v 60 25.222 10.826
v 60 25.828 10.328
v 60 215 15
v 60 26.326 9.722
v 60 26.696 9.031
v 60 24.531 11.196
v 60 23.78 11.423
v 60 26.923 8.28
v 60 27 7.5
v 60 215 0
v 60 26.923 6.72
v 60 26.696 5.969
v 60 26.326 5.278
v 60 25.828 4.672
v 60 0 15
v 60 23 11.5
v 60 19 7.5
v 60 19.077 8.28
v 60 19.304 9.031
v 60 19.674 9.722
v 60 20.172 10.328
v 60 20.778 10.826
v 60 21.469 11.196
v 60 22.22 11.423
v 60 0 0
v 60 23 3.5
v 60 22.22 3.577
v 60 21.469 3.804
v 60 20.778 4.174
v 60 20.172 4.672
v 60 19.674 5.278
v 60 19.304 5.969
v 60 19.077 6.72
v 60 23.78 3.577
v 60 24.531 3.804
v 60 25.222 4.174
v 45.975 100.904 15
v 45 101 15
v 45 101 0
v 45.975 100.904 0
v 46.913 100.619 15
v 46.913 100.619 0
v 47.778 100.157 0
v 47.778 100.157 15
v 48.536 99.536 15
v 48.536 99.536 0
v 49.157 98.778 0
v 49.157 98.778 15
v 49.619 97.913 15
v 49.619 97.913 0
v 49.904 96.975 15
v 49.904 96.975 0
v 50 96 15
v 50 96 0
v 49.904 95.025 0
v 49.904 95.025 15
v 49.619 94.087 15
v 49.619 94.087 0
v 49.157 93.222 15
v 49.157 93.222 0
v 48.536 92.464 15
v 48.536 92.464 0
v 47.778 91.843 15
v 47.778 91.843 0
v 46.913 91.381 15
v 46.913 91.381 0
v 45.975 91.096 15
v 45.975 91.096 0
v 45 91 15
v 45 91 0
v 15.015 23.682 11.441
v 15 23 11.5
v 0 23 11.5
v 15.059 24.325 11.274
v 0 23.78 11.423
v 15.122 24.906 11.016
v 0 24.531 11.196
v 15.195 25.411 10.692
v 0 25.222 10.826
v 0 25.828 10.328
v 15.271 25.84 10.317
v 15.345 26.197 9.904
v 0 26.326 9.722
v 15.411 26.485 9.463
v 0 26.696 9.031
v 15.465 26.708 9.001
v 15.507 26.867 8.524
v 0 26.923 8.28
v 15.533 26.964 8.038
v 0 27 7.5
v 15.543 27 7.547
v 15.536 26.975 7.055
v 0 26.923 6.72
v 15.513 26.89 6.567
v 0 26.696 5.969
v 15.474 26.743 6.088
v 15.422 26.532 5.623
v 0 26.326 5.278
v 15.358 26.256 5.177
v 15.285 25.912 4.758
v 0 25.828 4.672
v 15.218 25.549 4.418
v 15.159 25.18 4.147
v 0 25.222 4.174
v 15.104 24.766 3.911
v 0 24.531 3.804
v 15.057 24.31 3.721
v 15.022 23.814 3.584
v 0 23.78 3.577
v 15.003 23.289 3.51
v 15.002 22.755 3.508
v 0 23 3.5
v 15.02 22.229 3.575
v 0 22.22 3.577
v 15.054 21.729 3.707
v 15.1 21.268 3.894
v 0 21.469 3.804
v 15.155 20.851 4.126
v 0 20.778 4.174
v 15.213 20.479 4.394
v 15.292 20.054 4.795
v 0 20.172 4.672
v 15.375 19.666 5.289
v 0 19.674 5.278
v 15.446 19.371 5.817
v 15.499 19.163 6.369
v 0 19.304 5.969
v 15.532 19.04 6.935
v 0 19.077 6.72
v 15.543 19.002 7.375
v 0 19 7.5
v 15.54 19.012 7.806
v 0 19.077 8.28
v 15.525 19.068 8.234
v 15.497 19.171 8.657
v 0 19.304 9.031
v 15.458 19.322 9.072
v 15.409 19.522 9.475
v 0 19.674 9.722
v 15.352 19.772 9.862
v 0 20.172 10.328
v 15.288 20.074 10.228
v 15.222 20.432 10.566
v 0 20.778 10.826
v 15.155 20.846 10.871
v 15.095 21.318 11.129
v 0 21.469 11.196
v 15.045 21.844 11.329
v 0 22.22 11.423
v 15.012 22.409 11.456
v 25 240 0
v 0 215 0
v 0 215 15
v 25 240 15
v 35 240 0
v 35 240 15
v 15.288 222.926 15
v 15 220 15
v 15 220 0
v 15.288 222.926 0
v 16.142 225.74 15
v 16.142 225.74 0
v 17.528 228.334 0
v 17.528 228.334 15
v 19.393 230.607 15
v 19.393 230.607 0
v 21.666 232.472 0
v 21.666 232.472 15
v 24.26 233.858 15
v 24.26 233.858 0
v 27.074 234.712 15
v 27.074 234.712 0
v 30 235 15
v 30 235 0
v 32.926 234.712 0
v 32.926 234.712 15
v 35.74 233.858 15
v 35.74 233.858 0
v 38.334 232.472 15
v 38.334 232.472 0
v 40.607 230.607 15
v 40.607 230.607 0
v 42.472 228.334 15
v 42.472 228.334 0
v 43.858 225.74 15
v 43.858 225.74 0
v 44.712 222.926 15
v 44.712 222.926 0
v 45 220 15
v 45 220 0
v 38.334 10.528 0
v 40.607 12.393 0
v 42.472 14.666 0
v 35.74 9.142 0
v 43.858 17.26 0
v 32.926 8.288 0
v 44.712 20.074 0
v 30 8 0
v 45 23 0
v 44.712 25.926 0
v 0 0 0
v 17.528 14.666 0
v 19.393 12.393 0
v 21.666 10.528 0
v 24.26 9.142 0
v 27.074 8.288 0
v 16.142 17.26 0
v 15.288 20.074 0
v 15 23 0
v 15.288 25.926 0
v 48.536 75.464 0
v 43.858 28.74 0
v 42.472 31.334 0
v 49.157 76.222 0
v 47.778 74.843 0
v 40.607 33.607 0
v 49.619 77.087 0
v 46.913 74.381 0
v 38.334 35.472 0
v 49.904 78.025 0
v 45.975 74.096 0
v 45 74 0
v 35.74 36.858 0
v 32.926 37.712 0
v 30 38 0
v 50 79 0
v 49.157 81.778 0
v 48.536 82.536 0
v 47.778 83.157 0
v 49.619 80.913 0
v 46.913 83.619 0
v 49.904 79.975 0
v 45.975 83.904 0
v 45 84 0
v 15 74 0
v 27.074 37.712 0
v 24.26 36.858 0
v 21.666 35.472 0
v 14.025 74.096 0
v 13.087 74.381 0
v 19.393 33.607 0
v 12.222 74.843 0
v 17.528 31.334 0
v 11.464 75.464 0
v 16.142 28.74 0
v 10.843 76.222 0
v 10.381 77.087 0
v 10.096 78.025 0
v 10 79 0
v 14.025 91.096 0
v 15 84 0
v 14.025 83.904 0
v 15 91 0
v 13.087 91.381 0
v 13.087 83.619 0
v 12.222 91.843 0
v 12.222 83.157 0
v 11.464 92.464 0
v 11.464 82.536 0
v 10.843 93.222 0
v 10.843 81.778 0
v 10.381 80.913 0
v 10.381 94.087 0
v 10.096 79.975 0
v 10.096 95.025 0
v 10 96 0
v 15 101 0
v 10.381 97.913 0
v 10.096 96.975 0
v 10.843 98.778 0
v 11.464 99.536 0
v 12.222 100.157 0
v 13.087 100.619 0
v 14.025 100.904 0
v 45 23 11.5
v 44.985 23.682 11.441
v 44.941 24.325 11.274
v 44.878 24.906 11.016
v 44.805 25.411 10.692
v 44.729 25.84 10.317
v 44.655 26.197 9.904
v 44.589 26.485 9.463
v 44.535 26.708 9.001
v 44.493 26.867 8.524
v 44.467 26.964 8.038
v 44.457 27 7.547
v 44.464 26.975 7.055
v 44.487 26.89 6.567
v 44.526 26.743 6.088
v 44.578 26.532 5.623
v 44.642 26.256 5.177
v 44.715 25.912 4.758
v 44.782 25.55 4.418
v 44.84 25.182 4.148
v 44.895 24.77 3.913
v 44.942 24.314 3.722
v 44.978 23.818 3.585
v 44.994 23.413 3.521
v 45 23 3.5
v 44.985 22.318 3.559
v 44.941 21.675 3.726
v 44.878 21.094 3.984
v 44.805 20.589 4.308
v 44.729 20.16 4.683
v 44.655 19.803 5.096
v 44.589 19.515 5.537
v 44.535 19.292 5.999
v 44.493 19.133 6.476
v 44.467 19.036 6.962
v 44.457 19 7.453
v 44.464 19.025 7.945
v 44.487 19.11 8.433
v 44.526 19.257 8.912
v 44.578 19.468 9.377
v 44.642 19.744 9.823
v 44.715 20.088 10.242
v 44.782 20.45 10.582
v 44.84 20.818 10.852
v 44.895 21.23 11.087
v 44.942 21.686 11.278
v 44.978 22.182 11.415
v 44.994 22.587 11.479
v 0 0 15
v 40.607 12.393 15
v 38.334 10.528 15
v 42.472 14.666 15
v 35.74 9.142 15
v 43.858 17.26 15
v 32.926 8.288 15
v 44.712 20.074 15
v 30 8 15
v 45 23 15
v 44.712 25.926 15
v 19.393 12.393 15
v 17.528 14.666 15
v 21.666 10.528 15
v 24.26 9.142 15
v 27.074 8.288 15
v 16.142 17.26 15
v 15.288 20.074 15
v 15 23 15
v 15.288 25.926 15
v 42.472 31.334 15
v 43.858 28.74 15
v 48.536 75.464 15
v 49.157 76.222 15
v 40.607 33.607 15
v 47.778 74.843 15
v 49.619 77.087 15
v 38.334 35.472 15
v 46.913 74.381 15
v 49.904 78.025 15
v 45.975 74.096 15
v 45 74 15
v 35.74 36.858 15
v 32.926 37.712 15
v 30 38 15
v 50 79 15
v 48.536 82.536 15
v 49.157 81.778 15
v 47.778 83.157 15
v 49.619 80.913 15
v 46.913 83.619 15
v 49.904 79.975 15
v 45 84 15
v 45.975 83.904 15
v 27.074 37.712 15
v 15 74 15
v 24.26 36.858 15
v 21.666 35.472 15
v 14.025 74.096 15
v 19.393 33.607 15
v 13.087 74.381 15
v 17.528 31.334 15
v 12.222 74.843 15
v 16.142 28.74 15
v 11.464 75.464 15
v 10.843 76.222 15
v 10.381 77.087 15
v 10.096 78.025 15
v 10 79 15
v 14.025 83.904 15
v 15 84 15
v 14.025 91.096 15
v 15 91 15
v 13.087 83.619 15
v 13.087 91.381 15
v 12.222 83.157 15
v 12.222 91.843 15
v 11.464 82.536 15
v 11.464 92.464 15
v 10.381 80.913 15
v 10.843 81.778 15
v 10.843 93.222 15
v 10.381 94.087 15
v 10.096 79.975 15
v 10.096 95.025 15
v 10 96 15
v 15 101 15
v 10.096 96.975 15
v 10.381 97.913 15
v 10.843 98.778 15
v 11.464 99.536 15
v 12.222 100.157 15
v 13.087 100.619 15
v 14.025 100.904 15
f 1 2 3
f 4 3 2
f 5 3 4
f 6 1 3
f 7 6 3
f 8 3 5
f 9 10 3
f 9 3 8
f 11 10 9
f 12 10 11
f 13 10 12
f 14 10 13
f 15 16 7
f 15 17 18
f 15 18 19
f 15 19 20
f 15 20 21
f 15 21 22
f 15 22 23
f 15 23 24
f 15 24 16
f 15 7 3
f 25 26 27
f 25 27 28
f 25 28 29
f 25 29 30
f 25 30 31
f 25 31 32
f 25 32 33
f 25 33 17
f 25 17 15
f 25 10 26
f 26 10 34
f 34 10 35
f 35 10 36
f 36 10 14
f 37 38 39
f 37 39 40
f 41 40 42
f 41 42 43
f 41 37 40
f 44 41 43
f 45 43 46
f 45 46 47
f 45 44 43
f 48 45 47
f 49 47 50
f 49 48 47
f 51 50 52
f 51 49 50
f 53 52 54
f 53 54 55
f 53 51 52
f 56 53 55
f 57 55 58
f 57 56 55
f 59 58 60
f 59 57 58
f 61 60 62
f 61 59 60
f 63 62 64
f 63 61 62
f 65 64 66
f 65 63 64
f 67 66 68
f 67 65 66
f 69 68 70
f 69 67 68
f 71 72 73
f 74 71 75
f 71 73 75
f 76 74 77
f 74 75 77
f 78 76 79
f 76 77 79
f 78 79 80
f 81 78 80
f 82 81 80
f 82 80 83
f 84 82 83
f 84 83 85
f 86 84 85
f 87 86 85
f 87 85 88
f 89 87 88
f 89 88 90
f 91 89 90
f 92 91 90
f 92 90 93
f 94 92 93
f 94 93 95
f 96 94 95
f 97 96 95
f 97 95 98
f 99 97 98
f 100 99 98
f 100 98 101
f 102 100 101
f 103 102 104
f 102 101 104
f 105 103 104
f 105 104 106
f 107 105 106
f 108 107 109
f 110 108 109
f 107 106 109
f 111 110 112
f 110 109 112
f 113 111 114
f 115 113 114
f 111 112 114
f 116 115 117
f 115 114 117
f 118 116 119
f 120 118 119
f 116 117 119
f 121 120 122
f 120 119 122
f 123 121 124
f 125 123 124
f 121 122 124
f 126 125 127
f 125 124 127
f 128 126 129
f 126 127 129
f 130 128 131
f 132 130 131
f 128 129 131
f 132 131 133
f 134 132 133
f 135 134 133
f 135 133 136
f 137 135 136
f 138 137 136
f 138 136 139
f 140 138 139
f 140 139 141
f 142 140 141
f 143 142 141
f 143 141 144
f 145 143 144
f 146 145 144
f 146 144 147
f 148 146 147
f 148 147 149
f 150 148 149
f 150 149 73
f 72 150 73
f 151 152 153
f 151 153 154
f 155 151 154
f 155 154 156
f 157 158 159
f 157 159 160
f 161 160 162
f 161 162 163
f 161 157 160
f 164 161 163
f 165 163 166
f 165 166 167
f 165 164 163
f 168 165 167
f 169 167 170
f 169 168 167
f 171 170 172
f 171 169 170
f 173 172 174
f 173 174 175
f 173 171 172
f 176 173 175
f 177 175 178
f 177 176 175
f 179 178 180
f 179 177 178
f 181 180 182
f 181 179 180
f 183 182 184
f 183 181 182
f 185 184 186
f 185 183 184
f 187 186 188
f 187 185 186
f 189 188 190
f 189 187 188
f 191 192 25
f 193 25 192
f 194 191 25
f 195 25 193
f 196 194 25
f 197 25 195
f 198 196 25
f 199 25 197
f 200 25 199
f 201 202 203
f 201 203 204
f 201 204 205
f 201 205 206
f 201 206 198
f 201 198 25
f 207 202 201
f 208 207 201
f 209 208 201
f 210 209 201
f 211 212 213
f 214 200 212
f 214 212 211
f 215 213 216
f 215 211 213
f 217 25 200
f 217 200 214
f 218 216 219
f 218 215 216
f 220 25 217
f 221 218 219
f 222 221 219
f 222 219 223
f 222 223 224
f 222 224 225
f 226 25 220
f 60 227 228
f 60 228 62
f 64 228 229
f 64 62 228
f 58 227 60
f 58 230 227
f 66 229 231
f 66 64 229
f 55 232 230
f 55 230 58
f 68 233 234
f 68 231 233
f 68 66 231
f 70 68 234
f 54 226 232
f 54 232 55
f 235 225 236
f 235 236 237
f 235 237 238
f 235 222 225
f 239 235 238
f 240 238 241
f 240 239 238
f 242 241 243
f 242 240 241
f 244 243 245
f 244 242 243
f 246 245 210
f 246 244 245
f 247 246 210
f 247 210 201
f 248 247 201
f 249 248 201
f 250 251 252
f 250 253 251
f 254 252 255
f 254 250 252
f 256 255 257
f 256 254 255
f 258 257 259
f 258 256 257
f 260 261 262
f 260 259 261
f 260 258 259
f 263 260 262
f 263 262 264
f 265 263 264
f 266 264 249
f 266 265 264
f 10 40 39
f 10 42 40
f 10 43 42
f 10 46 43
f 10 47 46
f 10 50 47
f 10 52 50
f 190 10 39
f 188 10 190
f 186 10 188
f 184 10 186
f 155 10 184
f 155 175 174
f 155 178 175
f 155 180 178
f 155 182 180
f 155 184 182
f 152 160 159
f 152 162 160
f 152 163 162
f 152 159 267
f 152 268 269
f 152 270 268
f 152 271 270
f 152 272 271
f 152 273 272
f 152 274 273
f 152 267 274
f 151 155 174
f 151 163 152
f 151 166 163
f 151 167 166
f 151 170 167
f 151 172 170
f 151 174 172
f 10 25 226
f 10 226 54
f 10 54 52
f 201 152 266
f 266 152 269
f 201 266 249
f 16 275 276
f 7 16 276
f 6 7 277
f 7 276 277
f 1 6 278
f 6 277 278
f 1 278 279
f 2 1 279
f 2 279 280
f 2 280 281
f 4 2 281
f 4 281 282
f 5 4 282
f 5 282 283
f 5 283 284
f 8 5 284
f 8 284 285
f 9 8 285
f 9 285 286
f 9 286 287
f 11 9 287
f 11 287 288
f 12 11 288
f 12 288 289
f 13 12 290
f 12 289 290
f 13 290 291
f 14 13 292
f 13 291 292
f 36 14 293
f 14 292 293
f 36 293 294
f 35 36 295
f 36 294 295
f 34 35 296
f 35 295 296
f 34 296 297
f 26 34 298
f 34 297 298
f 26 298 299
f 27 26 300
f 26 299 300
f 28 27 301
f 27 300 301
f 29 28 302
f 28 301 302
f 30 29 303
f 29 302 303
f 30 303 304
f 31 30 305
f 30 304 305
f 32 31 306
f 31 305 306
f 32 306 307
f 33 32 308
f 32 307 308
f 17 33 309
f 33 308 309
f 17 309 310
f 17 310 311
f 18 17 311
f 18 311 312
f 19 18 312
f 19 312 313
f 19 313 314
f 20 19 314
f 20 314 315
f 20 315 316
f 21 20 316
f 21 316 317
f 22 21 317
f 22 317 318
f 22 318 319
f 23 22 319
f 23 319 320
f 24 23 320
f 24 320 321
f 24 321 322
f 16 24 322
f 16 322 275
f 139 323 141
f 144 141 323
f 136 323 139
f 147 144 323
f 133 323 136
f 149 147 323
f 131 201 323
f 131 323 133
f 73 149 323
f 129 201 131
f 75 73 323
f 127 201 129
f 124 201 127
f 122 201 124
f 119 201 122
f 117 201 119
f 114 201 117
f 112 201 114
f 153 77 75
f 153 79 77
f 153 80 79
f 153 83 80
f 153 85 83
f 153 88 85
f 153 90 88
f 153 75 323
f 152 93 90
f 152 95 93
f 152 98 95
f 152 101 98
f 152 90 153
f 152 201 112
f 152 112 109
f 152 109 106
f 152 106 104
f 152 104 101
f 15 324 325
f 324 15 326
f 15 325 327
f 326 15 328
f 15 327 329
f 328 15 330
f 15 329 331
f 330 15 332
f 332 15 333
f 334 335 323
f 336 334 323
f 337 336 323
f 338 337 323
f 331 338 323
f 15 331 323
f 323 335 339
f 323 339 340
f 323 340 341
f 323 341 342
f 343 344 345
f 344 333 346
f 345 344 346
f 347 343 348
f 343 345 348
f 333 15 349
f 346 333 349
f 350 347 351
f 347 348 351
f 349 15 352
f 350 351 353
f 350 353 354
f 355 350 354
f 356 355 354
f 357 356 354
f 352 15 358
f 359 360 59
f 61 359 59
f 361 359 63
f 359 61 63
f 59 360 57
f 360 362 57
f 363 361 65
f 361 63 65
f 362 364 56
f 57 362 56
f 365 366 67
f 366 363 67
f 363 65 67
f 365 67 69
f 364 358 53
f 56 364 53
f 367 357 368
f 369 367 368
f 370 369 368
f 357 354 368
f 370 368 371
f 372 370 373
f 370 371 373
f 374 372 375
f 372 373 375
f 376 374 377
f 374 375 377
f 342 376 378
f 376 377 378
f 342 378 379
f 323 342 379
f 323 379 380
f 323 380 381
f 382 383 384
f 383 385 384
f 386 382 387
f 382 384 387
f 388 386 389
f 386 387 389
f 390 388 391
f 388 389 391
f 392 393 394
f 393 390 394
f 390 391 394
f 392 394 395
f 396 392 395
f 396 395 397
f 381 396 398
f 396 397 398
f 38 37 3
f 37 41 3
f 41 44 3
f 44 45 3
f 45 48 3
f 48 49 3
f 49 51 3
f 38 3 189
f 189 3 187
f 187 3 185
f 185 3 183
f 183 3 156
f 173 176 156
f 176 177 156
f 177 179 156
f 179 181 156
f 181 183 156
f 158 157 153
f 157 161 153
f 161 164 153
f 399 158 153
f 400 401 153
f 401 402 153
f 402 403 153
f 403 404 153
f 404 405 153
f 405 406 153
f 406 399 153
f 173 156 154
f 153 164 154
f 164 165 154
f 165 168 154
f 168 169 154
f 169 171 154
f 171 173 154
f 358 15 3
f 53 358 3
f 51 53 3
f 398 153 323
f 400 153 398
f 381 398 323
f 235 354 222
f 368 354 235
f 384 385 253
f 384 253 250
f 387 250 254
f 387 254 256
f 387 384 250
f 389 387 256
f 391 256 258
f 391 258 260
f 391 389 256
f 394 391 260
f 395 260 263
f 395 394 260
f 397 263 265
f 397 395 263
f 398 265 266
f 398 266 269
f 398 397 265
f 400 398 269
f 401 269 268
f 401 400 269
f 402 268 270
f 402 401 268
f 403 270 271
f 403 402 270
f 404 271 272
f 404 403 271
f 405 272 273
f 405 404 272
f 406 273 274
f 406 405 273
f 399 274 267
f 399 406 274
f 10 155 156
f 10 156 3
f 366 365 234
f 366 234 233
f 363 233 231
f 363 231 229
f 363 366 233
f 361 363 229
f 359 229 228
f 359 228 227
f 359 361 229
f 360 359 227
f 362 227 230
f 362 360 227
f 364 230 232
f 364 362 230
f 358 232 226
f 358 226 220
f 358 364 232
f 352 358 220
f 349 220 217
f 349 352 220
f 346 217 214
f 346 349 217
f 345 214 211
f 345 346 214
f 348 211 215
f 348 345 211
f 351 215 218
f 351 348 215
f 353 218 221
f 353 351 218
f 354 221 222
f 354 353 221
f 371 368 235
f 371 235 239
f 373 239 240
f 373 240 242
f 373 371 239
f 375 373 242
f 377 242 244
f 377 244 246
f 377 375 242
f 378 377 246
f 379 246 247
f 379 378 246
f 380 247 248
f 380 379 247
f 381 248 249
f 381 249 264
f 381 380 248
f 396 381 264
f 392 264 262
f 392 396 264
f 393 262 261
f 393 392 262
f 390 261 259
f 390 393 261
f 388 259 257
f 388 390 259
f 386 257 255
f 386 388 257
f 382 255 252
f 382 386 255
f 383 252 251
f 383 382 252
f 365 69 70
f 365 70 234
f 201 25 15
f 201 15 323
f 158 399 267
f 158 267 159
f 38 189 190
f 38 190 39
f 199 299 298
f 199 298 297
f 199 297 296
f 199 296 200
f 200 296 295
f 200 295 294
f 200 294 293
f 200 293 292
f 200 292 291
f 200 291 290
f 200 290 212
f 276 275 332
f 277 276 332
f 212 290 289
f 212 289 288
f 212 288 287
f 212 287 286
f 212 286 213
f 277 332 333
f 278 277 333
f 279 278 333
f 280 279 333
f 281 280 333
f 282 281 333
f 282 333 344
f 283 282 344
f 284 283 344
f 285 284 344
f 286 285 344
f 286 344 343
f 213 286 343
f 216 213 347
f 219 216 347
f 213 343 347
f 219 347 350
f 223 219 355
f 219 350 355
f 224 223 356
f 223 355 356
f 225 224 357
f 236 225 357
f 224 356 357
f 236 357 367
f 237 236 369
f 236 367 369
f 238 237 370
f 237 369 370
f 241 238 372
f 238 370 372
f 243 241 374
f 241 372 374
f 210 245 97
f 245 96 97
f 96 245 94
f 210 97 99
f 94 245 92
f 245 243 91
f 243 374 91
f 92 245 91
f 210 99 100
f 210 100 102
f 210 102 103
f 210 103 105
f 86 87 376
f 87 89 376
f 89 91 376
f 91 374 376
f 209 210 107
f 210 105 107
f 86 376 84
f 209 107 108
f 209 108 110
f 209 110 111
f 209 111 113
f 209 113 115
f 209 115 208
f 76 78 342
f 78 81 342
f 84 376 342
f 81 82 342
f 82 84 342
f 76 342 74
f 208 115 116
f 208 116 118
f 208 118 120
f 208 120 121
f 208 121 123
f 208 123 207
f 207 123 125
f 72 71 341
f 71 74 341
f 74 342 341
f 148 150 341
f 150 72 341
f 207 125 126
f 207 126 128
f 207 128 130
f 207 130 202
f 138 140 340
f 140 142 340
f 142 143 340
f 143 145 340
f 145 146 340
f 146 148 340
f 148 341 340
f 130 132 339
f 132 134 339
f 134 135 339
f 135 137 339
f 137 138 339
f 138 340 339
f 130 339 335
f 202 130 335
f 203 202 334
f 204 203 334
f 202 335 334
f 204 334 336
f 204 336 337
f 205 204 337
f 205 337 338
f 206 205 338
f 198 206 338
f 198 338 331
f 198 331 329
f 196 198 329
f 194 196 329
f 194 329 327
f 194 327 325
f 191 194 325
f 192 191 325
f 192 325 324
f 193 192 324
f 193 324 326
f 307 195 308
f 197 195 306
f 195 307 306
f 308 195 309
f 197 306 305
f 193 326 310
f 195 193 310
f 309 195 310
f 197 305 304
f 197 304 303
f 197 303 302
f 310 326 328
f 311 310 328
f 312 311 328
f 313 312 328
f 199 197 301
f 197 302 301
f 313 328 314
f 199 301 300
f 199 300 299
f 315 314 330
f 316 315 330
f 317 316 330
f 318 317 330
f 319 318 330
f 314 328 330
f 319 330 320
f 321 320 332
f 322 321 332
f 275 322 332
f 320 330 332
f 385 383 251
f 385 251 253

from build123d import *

# Parameters (mm, degrees)
BASE_EXTRUSION_DEPTH    = 15
ESQUISSE2_R             = 15
ENL_V_MAT_EXTRU_1_DEPTH = 15
ENL_V_MAT_EXTRU_2_DEPTH = 15
ESQUISSE4_R             = 4
ENL_V_MAT_EXTRU_3_DEPTH = 248.840674628


with BuildPart() as part:
    # Esquisse1 → Base-Extrusion (new body)
    with BuildSketch(Plane.XY):
        Polygon((0, 215), (25, 240), (35, 240), (60, 215), (60, 0), (0, 0), align=None)
    extrude(amount=BASE_EXTRUSION_DEPTH)

    # Esquisse2 → Enlèv. mat.-Extru.1 (cut)
    with BuildSketch(Plane.XY.offset(15)):
        with Locations((30, 23)):
            Circle(ESQUISSE2_R)
    extrude(amount=-ENL_V_MAT_EXTRU_1_DEPTH, mode=Mode.SUBTRACT)

    # Esquisse3 → Enlèv. mat.-Extru.2 (cut)
    with BuildSketch(Plane.XY.offset(15)):
        with BuildLine():
            Line((45, 91), (45, 84))
            ThreePointArc((45, 84), (50, 79), (45, 74))
            Line((45, 74), (15, 74))
            ThreePointArc((15, 74), (10, 79), (15, 84))
            Line((15, 84), (15, 91))
            ThreePointArc((15, 91), (10, 96), (15, 101))
            Line((15, 101), (15, 220))
            ThreePointArc((15, 220), (30, 235), (45, 220))
            Line((45, 220), (45, 101))
            ThreePointArc((45, 101), (50, 96), (45, 91))
        make_face()
    extrude(amount=-ENL_V_MAT_EXTRU_2_DEPTH, mode=Mode.SUBTRACT)

    # Esquisse4 → Enlèv. mat.-Extru.3 (cut, through all)
    with BuildSketch(Plane.ZY):
        with Locations((7.5, 23)):
            Circle(ESQUISSE4_R)
    extrude(amount=-ENL_V_MAT_EXTRU_3_DEPTH, mode=Mode.SUBTRACT)


solid = part.part
